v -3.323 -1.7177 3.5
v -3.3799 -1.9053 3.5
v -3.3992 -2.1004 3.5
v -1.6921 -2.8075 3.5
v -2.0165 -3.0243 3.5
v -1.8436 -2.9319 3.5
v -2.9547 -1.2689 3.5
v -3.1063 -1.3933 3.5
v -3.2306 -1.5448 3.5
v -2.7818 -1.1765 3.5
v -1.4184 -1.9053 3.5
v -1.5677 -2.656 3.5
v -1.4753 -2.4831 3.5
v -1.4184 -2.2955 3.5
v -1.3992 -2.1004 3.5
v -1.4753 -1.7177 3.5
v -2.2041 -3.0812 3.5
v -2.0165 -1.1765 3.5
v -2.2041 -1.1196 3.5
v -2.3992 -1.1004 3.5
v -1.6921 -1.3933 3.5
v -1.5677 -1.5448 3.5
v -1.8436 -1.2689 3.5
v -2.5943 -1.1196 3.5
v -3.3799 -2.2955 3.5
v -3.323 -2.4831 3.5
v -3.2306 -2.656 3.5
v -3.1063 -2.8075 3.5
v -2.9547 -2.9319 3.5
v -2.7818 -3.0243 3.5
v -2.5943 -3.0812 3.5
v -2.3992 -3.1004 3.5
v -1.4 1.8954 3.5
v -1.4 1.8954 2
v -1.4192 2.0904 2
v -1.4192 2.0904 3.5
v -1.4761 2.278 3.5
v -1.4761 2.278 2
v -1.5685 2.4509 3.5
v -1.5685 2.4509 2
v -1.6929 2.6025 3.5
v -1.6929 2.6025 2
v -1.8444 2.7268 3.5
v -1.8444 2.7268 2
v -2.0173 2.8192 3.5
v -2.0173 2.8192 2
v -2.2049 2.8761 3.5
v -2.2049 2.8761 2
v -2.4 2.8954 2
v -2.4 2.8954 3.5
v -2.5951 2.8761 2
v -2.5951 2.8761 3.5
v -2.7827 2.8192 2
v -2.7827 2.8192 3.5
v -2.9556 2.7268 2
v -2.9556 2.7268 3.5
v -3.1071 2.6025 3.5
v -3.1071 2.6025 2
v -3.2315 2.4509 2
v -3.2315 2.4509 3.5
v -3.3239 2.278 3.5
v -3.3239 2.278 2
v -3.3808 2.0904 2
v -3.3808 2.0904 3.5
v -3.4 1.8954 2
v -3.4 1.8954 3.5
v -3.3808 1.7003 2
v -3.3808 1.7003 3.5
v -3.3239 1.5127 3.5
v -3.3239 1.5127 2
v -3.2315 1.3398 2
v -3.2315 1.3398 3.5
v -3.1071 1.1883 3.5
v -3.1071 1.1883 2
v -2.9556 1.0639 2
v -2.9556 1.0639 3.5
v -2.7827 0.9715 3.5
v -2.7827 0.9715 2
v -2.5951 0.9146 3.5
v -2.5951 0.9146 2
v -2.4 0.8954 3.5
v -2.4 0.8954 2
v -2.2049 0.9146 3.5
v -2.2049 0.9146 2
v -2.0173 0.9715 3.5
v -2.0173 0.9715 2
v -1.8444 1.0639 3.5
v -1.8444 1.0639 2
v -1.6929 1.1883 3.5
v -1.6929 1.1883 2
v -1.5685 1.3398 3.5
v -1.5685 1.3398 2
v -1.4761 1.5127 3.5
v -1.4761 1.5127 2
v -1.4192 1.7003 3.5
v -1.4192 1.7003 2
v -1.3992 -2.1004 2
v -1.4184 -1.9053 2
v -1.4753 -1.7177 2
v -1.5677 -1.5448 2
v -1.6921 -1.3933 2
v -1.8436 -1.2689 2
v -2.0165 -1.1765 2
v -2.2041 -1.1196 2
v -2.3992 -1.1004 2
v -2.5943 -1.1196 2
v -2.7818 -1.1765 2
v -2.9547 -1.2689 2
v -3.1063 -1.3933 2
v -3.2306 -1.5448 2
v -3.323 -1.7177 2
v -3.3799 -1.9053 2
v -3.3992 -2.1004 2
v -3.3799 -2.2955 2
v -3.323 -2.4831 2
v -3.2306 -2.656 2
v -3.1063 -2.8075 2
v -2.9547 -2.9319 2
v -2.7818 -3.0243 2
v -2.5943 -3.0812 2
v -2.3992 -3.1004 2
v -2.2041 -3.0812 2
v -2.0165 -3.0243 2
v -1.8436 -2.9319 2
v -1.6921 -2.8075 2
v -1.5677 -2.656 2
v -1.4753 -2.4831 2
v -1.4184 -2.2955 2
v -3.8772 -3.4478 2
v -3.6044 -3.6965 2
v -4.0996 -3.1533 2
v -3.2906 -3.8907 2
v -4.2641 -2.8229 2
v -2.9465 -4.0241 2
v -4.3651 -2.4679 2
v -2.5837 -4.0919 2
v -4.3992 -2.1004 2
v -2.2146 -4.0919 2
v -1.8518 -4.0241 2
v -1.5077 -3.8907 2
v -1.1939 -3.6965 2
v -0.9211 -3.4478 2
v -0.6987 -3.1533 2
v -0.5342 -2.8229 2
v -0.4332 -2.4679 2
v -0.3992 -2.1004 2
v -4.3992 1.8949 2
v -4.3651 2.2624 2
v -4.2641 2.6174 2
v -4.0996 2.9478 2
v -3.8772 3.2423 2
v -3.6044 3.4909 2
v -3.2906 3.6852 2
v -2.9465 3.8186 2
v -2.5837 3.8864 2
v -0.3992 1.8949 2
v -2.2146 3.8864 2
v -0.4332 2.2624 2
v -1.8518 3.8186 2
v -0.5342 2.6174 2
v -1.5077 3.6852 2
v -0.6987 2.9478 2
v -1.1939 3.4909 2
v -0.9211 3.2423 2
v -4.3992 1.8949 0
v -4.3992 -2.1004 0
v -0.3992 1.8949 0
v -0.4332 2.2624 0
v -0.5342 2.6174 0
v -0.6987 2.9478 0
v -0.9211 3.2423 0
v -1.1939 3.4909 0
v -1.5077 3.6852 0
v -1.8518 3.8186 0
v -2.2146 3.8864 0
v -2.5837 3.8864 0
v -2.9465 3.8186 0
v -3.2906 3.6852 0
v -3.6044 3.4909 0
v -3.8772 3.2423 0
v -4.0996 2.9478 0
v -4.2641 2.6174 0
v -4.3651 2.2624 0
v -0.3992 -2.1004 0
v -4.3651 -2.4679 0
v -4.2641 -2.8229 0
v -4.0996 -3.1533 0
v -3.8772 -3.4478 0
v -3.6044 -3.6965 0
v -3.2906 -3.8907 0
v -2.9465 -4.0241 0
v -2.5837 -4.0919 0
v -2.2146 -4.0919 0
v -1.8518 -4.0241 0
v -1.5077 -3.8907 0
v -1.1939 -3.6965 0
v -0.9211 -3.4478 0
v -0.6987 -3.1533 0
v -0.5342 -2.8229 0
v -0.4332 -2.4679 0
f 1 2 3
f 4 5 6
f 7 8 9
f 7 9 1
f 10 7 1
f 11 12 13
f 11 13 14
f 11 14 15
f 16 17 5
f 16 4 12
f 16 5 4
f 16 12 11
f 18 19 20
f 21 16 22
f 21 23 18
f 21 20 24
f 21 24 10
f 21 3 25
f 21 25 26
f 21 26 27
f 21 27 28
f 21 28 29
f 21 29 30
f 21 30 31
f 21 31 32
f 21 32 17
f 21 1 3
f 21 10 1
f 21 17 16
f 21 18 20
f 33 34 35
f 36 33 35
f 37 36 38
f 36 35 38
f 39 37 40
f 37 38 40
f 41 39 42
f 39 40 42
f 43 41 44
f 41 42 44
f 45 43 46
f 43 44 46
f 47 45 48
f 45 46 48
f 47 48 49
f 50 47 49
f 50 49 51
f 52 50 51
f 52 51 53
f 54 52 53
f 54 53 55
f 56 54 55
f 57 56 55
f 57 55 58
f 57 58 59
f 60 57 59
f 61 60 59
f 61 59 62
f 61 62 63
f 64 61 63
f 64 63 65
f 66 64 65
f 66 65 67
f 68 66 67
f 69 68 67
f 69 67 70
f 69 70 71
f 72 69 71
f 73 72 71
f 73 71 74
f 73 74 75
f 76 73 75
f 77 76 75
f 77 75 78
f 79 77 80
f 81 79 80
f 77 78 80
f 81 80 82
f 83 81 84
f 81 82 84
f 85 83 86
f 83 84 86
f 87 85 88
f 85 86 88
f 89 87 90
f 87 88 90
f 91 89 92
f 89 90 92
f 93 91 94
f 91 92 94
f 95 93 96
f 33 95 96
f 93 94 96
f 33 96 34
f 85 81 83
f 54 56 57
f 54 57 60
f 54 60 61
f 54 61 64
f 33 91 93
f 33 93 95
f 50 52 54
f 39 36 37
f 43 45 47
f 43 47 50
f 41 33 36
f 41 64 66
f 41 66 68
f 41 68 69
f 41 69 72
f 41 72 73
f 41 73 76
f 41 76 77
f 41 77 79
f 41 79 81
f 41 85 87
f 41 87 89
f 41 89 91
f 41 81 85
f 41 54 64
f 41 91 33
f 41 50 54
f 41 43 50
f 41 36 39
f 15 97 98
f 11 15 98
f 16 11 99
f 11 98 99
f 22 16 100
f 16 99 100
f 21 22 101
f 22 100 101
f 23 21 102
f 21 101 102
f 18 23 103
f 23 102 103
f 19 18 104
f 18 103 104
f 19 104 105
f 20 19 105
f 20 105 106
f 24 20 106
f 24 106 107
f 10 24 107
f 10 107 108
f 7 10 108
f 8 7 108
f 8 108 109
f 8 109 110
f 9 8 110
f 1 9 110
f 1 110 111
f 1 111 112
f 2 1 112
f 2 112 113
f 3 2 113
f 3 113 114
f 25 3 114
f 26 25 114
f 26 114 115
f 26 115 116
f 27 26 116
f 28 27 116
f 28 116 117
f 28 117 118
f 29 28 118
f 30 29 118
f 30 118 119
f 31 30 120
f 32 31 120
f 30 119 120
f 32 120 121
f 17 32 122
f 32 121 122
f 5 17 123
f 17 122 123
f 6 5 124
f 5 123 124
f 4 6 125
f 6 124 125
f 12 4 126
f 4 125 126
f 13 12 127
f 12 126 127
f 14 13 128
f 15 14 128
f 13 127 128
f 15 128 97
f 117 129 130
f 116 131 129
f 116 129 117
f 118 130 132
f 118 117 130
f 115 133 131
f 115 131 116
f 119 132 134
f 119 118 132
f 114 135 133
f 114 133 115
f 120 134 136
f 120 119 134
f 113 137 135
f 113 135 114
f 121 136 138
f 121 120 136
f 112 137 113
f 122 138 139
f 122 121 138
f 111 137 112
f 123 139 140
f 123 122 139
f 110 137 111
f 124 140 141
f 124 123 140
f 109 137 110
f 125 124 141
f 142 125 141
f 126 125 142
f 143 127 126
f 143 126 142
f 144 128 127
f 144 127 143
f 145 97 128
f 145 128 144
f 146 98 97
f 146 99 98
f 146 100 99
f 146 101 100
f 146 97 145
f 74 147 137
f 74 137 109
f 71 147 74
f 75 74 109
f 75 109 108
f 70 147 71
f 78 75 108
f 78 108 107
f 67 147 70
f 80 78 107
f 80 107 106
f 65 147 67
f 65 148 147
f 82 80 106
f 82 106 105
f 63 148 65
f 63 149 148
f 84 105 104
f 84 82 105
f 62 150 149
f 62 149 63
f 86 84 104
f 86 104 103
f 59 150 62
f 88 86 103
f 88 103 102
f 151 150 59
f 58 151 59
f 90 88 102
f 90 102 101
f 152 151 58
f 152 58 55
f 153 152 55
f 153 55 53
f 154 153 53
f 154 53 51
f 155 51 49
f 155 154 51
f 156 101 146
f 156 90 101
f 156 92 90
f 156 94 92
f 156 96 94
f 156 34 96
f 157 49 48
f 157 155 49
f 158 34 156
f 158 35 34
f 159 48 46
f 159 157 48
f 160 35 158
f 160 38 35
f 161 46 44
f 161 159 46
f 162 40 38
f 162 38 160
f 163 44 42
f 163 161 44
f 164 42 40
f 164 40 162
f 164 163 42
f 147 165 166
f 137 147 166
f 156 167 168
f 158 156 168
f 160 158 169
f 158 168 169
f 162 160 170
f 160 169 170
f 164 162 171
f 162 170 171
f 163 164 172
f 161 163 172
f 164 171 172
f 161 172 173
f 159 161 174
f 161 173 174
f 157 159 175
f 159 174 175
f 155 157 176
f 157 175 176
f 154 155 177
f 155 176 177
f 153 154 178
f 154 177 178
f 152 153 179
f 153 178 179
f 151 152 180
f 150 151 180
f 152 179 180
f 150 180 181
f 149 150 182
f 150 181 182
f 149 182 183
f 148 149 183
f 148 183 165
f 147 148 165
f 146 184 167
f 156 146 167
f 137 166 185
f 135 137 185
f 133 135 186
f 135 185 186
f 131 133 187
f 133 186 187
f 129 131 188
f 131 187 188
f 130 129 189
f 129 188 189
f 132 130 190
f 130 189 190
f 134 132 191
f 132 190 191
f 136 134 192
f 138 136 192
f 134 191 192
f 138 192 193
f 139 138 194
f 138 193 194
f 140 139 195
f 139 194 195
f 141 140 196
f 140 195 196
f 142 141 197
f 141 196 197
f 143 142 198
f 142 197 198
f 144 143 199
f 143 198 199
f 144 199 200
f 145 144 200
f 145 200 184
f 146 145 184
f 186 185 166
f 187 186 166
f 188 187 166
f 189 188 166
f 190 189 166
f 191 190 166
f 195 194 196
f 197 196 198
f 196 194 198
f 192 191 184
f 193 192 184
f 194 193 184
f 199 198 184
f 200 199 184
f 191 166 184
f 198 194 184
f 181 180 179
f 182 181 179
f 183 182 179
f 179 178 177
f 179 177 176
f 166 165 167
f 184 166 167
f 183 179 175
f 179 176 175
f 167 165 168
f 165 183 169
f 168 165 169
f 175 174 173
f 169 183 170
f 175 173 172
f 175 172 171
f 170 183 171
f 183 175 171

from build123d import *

# Parameters (mm, degrees)
F0_R     = 1
F1_DEPTH = 3.5
F2_DEPTH = 2
F3_DEPTH = 2


# Not quite as in the source:
# - a feature names something its author has since deleted; it is built from what else it names


with BuildPart() as f1:
    # F0 (on Top) → F1 (new body)
    with BuildSketch(Plane.XY):
        with Locations((-2.3999998812, 1.8953582125)):
            Circle(F0_R)
    extrude(amount=F1_DEPTH)



with BuildPart() as f1b:
    # F0 (on Top) → F1, piece 2 (new body)
    with BuildSketch(Plane.XY):
        with Locations((-2.3991598333, -2.1004185153)):
            Circle(F0_R)
    extrude(amount=F1_DEPTH)


with BuildPart() as f1_1:
    add(f1.part)

    add(f1b.part)  # F2 merges F1b
    # F0 (on Top) → F2 (join)
    with BuildSketch(Plane.XY):
        with BuildLine():
            ThreePointArc((-2.4958517574, -0.1027572147), (-3.8471556634, -0.7208141967), (-4.3991598333, -2.1004185153))
            ThreePointArc((-4.3991598333, -2.1004185153), (-2.3991598333, -4.1004185153), (-0.3991598333, -2.1004185153))
            ThreePointArc((-0.3991598333, -2.1004185153), (-0.9511640032, -0.7208141967), (-2.3024679093, -0.1027572147))
            ThreePointArc((-2.3024679093, -0.1027572147), (-2.3991598333, -0.1050959142), (-2.4958517574, -0.1027572147))
        make_face()
        with Locations((-2.3991598333, -2.1004185153)):
            Circle(F0_R, mode=Mode.SUBTRACT)
        with BuildLine():
            ThreePointArc((-2.3024679093, -0.1027572147), (-0.9511640032, -0.7208141967), (-0.3991598333, -2.1004185153))
            Line((-0.3991598333, -2.1004185153), (-0.3991598333, 1.8949040858))
            ThreePointArc((-0.3991598333, 1.8949040858), (-0.9511640032, 0.5152997672), (-2.3024679093, -0.1027572147))
        make_face()
        with BuildLine():
            ThreePointArc((-4.3991598333, 1.8949040858), (-3.8471556634, 0.5152997672), (-2.4958517574, -0.1027572147))
            ThreePointArc((-2.4958517574, -0.1027572147), (-2.3991598333, -0.1004185153), (-2.3024679093, -0.1027572147))
            ThreePointArc((-2.3024679093, -0.1027572147), (-0.9511640032, 0.5152997672), (-0.3991598333, 1.8949040858))
            ThreePointArc((-0.3991598333, 1.8949040858), (-2.3991598333, 3.8949040858), (-4.3991598333, 1.8949040858))
        make_face()
        with Locations((-2.3999998812, 1.8953582125)):
            Circle(F0_R, mode=Mode.SUBTRACT)
        with BuildLine():
            ThreePointArc((-2.3024679093, -0.1027572147), (-2.3991598333, -0.1004185153), (-2.4958517574, -0.1027572147))
            ThreePointArc((-2.4958517574, -0.1027572147), (-2.3991598333, -0.1050959142), (-2.3024679093, -0.1027572147))
        make_face()
    extrude(amount=F2_DEPTH)

    # F0 (on Top) → F3 (join)
    with BuildSketch(Plane.XY):
        with BuildLine():
            Line((-4.3991598333, 1.8949040858), (-4.3991598333, -2.1004185153))
            ThreePointArc((-4.3991598333, -2.1004185153), (-3.8471556634, -0.7208141967), (-2.4958517574, -0.1027572147))
            ThreePointArc((-2.4958517574, -0.1027572147), (-3.8471556634, 0.5152997672), (-4.3991598333, 1.8949040858))
        make_face()
    extrude(amount=F3_DEPTH)


solid = f1_1.part
